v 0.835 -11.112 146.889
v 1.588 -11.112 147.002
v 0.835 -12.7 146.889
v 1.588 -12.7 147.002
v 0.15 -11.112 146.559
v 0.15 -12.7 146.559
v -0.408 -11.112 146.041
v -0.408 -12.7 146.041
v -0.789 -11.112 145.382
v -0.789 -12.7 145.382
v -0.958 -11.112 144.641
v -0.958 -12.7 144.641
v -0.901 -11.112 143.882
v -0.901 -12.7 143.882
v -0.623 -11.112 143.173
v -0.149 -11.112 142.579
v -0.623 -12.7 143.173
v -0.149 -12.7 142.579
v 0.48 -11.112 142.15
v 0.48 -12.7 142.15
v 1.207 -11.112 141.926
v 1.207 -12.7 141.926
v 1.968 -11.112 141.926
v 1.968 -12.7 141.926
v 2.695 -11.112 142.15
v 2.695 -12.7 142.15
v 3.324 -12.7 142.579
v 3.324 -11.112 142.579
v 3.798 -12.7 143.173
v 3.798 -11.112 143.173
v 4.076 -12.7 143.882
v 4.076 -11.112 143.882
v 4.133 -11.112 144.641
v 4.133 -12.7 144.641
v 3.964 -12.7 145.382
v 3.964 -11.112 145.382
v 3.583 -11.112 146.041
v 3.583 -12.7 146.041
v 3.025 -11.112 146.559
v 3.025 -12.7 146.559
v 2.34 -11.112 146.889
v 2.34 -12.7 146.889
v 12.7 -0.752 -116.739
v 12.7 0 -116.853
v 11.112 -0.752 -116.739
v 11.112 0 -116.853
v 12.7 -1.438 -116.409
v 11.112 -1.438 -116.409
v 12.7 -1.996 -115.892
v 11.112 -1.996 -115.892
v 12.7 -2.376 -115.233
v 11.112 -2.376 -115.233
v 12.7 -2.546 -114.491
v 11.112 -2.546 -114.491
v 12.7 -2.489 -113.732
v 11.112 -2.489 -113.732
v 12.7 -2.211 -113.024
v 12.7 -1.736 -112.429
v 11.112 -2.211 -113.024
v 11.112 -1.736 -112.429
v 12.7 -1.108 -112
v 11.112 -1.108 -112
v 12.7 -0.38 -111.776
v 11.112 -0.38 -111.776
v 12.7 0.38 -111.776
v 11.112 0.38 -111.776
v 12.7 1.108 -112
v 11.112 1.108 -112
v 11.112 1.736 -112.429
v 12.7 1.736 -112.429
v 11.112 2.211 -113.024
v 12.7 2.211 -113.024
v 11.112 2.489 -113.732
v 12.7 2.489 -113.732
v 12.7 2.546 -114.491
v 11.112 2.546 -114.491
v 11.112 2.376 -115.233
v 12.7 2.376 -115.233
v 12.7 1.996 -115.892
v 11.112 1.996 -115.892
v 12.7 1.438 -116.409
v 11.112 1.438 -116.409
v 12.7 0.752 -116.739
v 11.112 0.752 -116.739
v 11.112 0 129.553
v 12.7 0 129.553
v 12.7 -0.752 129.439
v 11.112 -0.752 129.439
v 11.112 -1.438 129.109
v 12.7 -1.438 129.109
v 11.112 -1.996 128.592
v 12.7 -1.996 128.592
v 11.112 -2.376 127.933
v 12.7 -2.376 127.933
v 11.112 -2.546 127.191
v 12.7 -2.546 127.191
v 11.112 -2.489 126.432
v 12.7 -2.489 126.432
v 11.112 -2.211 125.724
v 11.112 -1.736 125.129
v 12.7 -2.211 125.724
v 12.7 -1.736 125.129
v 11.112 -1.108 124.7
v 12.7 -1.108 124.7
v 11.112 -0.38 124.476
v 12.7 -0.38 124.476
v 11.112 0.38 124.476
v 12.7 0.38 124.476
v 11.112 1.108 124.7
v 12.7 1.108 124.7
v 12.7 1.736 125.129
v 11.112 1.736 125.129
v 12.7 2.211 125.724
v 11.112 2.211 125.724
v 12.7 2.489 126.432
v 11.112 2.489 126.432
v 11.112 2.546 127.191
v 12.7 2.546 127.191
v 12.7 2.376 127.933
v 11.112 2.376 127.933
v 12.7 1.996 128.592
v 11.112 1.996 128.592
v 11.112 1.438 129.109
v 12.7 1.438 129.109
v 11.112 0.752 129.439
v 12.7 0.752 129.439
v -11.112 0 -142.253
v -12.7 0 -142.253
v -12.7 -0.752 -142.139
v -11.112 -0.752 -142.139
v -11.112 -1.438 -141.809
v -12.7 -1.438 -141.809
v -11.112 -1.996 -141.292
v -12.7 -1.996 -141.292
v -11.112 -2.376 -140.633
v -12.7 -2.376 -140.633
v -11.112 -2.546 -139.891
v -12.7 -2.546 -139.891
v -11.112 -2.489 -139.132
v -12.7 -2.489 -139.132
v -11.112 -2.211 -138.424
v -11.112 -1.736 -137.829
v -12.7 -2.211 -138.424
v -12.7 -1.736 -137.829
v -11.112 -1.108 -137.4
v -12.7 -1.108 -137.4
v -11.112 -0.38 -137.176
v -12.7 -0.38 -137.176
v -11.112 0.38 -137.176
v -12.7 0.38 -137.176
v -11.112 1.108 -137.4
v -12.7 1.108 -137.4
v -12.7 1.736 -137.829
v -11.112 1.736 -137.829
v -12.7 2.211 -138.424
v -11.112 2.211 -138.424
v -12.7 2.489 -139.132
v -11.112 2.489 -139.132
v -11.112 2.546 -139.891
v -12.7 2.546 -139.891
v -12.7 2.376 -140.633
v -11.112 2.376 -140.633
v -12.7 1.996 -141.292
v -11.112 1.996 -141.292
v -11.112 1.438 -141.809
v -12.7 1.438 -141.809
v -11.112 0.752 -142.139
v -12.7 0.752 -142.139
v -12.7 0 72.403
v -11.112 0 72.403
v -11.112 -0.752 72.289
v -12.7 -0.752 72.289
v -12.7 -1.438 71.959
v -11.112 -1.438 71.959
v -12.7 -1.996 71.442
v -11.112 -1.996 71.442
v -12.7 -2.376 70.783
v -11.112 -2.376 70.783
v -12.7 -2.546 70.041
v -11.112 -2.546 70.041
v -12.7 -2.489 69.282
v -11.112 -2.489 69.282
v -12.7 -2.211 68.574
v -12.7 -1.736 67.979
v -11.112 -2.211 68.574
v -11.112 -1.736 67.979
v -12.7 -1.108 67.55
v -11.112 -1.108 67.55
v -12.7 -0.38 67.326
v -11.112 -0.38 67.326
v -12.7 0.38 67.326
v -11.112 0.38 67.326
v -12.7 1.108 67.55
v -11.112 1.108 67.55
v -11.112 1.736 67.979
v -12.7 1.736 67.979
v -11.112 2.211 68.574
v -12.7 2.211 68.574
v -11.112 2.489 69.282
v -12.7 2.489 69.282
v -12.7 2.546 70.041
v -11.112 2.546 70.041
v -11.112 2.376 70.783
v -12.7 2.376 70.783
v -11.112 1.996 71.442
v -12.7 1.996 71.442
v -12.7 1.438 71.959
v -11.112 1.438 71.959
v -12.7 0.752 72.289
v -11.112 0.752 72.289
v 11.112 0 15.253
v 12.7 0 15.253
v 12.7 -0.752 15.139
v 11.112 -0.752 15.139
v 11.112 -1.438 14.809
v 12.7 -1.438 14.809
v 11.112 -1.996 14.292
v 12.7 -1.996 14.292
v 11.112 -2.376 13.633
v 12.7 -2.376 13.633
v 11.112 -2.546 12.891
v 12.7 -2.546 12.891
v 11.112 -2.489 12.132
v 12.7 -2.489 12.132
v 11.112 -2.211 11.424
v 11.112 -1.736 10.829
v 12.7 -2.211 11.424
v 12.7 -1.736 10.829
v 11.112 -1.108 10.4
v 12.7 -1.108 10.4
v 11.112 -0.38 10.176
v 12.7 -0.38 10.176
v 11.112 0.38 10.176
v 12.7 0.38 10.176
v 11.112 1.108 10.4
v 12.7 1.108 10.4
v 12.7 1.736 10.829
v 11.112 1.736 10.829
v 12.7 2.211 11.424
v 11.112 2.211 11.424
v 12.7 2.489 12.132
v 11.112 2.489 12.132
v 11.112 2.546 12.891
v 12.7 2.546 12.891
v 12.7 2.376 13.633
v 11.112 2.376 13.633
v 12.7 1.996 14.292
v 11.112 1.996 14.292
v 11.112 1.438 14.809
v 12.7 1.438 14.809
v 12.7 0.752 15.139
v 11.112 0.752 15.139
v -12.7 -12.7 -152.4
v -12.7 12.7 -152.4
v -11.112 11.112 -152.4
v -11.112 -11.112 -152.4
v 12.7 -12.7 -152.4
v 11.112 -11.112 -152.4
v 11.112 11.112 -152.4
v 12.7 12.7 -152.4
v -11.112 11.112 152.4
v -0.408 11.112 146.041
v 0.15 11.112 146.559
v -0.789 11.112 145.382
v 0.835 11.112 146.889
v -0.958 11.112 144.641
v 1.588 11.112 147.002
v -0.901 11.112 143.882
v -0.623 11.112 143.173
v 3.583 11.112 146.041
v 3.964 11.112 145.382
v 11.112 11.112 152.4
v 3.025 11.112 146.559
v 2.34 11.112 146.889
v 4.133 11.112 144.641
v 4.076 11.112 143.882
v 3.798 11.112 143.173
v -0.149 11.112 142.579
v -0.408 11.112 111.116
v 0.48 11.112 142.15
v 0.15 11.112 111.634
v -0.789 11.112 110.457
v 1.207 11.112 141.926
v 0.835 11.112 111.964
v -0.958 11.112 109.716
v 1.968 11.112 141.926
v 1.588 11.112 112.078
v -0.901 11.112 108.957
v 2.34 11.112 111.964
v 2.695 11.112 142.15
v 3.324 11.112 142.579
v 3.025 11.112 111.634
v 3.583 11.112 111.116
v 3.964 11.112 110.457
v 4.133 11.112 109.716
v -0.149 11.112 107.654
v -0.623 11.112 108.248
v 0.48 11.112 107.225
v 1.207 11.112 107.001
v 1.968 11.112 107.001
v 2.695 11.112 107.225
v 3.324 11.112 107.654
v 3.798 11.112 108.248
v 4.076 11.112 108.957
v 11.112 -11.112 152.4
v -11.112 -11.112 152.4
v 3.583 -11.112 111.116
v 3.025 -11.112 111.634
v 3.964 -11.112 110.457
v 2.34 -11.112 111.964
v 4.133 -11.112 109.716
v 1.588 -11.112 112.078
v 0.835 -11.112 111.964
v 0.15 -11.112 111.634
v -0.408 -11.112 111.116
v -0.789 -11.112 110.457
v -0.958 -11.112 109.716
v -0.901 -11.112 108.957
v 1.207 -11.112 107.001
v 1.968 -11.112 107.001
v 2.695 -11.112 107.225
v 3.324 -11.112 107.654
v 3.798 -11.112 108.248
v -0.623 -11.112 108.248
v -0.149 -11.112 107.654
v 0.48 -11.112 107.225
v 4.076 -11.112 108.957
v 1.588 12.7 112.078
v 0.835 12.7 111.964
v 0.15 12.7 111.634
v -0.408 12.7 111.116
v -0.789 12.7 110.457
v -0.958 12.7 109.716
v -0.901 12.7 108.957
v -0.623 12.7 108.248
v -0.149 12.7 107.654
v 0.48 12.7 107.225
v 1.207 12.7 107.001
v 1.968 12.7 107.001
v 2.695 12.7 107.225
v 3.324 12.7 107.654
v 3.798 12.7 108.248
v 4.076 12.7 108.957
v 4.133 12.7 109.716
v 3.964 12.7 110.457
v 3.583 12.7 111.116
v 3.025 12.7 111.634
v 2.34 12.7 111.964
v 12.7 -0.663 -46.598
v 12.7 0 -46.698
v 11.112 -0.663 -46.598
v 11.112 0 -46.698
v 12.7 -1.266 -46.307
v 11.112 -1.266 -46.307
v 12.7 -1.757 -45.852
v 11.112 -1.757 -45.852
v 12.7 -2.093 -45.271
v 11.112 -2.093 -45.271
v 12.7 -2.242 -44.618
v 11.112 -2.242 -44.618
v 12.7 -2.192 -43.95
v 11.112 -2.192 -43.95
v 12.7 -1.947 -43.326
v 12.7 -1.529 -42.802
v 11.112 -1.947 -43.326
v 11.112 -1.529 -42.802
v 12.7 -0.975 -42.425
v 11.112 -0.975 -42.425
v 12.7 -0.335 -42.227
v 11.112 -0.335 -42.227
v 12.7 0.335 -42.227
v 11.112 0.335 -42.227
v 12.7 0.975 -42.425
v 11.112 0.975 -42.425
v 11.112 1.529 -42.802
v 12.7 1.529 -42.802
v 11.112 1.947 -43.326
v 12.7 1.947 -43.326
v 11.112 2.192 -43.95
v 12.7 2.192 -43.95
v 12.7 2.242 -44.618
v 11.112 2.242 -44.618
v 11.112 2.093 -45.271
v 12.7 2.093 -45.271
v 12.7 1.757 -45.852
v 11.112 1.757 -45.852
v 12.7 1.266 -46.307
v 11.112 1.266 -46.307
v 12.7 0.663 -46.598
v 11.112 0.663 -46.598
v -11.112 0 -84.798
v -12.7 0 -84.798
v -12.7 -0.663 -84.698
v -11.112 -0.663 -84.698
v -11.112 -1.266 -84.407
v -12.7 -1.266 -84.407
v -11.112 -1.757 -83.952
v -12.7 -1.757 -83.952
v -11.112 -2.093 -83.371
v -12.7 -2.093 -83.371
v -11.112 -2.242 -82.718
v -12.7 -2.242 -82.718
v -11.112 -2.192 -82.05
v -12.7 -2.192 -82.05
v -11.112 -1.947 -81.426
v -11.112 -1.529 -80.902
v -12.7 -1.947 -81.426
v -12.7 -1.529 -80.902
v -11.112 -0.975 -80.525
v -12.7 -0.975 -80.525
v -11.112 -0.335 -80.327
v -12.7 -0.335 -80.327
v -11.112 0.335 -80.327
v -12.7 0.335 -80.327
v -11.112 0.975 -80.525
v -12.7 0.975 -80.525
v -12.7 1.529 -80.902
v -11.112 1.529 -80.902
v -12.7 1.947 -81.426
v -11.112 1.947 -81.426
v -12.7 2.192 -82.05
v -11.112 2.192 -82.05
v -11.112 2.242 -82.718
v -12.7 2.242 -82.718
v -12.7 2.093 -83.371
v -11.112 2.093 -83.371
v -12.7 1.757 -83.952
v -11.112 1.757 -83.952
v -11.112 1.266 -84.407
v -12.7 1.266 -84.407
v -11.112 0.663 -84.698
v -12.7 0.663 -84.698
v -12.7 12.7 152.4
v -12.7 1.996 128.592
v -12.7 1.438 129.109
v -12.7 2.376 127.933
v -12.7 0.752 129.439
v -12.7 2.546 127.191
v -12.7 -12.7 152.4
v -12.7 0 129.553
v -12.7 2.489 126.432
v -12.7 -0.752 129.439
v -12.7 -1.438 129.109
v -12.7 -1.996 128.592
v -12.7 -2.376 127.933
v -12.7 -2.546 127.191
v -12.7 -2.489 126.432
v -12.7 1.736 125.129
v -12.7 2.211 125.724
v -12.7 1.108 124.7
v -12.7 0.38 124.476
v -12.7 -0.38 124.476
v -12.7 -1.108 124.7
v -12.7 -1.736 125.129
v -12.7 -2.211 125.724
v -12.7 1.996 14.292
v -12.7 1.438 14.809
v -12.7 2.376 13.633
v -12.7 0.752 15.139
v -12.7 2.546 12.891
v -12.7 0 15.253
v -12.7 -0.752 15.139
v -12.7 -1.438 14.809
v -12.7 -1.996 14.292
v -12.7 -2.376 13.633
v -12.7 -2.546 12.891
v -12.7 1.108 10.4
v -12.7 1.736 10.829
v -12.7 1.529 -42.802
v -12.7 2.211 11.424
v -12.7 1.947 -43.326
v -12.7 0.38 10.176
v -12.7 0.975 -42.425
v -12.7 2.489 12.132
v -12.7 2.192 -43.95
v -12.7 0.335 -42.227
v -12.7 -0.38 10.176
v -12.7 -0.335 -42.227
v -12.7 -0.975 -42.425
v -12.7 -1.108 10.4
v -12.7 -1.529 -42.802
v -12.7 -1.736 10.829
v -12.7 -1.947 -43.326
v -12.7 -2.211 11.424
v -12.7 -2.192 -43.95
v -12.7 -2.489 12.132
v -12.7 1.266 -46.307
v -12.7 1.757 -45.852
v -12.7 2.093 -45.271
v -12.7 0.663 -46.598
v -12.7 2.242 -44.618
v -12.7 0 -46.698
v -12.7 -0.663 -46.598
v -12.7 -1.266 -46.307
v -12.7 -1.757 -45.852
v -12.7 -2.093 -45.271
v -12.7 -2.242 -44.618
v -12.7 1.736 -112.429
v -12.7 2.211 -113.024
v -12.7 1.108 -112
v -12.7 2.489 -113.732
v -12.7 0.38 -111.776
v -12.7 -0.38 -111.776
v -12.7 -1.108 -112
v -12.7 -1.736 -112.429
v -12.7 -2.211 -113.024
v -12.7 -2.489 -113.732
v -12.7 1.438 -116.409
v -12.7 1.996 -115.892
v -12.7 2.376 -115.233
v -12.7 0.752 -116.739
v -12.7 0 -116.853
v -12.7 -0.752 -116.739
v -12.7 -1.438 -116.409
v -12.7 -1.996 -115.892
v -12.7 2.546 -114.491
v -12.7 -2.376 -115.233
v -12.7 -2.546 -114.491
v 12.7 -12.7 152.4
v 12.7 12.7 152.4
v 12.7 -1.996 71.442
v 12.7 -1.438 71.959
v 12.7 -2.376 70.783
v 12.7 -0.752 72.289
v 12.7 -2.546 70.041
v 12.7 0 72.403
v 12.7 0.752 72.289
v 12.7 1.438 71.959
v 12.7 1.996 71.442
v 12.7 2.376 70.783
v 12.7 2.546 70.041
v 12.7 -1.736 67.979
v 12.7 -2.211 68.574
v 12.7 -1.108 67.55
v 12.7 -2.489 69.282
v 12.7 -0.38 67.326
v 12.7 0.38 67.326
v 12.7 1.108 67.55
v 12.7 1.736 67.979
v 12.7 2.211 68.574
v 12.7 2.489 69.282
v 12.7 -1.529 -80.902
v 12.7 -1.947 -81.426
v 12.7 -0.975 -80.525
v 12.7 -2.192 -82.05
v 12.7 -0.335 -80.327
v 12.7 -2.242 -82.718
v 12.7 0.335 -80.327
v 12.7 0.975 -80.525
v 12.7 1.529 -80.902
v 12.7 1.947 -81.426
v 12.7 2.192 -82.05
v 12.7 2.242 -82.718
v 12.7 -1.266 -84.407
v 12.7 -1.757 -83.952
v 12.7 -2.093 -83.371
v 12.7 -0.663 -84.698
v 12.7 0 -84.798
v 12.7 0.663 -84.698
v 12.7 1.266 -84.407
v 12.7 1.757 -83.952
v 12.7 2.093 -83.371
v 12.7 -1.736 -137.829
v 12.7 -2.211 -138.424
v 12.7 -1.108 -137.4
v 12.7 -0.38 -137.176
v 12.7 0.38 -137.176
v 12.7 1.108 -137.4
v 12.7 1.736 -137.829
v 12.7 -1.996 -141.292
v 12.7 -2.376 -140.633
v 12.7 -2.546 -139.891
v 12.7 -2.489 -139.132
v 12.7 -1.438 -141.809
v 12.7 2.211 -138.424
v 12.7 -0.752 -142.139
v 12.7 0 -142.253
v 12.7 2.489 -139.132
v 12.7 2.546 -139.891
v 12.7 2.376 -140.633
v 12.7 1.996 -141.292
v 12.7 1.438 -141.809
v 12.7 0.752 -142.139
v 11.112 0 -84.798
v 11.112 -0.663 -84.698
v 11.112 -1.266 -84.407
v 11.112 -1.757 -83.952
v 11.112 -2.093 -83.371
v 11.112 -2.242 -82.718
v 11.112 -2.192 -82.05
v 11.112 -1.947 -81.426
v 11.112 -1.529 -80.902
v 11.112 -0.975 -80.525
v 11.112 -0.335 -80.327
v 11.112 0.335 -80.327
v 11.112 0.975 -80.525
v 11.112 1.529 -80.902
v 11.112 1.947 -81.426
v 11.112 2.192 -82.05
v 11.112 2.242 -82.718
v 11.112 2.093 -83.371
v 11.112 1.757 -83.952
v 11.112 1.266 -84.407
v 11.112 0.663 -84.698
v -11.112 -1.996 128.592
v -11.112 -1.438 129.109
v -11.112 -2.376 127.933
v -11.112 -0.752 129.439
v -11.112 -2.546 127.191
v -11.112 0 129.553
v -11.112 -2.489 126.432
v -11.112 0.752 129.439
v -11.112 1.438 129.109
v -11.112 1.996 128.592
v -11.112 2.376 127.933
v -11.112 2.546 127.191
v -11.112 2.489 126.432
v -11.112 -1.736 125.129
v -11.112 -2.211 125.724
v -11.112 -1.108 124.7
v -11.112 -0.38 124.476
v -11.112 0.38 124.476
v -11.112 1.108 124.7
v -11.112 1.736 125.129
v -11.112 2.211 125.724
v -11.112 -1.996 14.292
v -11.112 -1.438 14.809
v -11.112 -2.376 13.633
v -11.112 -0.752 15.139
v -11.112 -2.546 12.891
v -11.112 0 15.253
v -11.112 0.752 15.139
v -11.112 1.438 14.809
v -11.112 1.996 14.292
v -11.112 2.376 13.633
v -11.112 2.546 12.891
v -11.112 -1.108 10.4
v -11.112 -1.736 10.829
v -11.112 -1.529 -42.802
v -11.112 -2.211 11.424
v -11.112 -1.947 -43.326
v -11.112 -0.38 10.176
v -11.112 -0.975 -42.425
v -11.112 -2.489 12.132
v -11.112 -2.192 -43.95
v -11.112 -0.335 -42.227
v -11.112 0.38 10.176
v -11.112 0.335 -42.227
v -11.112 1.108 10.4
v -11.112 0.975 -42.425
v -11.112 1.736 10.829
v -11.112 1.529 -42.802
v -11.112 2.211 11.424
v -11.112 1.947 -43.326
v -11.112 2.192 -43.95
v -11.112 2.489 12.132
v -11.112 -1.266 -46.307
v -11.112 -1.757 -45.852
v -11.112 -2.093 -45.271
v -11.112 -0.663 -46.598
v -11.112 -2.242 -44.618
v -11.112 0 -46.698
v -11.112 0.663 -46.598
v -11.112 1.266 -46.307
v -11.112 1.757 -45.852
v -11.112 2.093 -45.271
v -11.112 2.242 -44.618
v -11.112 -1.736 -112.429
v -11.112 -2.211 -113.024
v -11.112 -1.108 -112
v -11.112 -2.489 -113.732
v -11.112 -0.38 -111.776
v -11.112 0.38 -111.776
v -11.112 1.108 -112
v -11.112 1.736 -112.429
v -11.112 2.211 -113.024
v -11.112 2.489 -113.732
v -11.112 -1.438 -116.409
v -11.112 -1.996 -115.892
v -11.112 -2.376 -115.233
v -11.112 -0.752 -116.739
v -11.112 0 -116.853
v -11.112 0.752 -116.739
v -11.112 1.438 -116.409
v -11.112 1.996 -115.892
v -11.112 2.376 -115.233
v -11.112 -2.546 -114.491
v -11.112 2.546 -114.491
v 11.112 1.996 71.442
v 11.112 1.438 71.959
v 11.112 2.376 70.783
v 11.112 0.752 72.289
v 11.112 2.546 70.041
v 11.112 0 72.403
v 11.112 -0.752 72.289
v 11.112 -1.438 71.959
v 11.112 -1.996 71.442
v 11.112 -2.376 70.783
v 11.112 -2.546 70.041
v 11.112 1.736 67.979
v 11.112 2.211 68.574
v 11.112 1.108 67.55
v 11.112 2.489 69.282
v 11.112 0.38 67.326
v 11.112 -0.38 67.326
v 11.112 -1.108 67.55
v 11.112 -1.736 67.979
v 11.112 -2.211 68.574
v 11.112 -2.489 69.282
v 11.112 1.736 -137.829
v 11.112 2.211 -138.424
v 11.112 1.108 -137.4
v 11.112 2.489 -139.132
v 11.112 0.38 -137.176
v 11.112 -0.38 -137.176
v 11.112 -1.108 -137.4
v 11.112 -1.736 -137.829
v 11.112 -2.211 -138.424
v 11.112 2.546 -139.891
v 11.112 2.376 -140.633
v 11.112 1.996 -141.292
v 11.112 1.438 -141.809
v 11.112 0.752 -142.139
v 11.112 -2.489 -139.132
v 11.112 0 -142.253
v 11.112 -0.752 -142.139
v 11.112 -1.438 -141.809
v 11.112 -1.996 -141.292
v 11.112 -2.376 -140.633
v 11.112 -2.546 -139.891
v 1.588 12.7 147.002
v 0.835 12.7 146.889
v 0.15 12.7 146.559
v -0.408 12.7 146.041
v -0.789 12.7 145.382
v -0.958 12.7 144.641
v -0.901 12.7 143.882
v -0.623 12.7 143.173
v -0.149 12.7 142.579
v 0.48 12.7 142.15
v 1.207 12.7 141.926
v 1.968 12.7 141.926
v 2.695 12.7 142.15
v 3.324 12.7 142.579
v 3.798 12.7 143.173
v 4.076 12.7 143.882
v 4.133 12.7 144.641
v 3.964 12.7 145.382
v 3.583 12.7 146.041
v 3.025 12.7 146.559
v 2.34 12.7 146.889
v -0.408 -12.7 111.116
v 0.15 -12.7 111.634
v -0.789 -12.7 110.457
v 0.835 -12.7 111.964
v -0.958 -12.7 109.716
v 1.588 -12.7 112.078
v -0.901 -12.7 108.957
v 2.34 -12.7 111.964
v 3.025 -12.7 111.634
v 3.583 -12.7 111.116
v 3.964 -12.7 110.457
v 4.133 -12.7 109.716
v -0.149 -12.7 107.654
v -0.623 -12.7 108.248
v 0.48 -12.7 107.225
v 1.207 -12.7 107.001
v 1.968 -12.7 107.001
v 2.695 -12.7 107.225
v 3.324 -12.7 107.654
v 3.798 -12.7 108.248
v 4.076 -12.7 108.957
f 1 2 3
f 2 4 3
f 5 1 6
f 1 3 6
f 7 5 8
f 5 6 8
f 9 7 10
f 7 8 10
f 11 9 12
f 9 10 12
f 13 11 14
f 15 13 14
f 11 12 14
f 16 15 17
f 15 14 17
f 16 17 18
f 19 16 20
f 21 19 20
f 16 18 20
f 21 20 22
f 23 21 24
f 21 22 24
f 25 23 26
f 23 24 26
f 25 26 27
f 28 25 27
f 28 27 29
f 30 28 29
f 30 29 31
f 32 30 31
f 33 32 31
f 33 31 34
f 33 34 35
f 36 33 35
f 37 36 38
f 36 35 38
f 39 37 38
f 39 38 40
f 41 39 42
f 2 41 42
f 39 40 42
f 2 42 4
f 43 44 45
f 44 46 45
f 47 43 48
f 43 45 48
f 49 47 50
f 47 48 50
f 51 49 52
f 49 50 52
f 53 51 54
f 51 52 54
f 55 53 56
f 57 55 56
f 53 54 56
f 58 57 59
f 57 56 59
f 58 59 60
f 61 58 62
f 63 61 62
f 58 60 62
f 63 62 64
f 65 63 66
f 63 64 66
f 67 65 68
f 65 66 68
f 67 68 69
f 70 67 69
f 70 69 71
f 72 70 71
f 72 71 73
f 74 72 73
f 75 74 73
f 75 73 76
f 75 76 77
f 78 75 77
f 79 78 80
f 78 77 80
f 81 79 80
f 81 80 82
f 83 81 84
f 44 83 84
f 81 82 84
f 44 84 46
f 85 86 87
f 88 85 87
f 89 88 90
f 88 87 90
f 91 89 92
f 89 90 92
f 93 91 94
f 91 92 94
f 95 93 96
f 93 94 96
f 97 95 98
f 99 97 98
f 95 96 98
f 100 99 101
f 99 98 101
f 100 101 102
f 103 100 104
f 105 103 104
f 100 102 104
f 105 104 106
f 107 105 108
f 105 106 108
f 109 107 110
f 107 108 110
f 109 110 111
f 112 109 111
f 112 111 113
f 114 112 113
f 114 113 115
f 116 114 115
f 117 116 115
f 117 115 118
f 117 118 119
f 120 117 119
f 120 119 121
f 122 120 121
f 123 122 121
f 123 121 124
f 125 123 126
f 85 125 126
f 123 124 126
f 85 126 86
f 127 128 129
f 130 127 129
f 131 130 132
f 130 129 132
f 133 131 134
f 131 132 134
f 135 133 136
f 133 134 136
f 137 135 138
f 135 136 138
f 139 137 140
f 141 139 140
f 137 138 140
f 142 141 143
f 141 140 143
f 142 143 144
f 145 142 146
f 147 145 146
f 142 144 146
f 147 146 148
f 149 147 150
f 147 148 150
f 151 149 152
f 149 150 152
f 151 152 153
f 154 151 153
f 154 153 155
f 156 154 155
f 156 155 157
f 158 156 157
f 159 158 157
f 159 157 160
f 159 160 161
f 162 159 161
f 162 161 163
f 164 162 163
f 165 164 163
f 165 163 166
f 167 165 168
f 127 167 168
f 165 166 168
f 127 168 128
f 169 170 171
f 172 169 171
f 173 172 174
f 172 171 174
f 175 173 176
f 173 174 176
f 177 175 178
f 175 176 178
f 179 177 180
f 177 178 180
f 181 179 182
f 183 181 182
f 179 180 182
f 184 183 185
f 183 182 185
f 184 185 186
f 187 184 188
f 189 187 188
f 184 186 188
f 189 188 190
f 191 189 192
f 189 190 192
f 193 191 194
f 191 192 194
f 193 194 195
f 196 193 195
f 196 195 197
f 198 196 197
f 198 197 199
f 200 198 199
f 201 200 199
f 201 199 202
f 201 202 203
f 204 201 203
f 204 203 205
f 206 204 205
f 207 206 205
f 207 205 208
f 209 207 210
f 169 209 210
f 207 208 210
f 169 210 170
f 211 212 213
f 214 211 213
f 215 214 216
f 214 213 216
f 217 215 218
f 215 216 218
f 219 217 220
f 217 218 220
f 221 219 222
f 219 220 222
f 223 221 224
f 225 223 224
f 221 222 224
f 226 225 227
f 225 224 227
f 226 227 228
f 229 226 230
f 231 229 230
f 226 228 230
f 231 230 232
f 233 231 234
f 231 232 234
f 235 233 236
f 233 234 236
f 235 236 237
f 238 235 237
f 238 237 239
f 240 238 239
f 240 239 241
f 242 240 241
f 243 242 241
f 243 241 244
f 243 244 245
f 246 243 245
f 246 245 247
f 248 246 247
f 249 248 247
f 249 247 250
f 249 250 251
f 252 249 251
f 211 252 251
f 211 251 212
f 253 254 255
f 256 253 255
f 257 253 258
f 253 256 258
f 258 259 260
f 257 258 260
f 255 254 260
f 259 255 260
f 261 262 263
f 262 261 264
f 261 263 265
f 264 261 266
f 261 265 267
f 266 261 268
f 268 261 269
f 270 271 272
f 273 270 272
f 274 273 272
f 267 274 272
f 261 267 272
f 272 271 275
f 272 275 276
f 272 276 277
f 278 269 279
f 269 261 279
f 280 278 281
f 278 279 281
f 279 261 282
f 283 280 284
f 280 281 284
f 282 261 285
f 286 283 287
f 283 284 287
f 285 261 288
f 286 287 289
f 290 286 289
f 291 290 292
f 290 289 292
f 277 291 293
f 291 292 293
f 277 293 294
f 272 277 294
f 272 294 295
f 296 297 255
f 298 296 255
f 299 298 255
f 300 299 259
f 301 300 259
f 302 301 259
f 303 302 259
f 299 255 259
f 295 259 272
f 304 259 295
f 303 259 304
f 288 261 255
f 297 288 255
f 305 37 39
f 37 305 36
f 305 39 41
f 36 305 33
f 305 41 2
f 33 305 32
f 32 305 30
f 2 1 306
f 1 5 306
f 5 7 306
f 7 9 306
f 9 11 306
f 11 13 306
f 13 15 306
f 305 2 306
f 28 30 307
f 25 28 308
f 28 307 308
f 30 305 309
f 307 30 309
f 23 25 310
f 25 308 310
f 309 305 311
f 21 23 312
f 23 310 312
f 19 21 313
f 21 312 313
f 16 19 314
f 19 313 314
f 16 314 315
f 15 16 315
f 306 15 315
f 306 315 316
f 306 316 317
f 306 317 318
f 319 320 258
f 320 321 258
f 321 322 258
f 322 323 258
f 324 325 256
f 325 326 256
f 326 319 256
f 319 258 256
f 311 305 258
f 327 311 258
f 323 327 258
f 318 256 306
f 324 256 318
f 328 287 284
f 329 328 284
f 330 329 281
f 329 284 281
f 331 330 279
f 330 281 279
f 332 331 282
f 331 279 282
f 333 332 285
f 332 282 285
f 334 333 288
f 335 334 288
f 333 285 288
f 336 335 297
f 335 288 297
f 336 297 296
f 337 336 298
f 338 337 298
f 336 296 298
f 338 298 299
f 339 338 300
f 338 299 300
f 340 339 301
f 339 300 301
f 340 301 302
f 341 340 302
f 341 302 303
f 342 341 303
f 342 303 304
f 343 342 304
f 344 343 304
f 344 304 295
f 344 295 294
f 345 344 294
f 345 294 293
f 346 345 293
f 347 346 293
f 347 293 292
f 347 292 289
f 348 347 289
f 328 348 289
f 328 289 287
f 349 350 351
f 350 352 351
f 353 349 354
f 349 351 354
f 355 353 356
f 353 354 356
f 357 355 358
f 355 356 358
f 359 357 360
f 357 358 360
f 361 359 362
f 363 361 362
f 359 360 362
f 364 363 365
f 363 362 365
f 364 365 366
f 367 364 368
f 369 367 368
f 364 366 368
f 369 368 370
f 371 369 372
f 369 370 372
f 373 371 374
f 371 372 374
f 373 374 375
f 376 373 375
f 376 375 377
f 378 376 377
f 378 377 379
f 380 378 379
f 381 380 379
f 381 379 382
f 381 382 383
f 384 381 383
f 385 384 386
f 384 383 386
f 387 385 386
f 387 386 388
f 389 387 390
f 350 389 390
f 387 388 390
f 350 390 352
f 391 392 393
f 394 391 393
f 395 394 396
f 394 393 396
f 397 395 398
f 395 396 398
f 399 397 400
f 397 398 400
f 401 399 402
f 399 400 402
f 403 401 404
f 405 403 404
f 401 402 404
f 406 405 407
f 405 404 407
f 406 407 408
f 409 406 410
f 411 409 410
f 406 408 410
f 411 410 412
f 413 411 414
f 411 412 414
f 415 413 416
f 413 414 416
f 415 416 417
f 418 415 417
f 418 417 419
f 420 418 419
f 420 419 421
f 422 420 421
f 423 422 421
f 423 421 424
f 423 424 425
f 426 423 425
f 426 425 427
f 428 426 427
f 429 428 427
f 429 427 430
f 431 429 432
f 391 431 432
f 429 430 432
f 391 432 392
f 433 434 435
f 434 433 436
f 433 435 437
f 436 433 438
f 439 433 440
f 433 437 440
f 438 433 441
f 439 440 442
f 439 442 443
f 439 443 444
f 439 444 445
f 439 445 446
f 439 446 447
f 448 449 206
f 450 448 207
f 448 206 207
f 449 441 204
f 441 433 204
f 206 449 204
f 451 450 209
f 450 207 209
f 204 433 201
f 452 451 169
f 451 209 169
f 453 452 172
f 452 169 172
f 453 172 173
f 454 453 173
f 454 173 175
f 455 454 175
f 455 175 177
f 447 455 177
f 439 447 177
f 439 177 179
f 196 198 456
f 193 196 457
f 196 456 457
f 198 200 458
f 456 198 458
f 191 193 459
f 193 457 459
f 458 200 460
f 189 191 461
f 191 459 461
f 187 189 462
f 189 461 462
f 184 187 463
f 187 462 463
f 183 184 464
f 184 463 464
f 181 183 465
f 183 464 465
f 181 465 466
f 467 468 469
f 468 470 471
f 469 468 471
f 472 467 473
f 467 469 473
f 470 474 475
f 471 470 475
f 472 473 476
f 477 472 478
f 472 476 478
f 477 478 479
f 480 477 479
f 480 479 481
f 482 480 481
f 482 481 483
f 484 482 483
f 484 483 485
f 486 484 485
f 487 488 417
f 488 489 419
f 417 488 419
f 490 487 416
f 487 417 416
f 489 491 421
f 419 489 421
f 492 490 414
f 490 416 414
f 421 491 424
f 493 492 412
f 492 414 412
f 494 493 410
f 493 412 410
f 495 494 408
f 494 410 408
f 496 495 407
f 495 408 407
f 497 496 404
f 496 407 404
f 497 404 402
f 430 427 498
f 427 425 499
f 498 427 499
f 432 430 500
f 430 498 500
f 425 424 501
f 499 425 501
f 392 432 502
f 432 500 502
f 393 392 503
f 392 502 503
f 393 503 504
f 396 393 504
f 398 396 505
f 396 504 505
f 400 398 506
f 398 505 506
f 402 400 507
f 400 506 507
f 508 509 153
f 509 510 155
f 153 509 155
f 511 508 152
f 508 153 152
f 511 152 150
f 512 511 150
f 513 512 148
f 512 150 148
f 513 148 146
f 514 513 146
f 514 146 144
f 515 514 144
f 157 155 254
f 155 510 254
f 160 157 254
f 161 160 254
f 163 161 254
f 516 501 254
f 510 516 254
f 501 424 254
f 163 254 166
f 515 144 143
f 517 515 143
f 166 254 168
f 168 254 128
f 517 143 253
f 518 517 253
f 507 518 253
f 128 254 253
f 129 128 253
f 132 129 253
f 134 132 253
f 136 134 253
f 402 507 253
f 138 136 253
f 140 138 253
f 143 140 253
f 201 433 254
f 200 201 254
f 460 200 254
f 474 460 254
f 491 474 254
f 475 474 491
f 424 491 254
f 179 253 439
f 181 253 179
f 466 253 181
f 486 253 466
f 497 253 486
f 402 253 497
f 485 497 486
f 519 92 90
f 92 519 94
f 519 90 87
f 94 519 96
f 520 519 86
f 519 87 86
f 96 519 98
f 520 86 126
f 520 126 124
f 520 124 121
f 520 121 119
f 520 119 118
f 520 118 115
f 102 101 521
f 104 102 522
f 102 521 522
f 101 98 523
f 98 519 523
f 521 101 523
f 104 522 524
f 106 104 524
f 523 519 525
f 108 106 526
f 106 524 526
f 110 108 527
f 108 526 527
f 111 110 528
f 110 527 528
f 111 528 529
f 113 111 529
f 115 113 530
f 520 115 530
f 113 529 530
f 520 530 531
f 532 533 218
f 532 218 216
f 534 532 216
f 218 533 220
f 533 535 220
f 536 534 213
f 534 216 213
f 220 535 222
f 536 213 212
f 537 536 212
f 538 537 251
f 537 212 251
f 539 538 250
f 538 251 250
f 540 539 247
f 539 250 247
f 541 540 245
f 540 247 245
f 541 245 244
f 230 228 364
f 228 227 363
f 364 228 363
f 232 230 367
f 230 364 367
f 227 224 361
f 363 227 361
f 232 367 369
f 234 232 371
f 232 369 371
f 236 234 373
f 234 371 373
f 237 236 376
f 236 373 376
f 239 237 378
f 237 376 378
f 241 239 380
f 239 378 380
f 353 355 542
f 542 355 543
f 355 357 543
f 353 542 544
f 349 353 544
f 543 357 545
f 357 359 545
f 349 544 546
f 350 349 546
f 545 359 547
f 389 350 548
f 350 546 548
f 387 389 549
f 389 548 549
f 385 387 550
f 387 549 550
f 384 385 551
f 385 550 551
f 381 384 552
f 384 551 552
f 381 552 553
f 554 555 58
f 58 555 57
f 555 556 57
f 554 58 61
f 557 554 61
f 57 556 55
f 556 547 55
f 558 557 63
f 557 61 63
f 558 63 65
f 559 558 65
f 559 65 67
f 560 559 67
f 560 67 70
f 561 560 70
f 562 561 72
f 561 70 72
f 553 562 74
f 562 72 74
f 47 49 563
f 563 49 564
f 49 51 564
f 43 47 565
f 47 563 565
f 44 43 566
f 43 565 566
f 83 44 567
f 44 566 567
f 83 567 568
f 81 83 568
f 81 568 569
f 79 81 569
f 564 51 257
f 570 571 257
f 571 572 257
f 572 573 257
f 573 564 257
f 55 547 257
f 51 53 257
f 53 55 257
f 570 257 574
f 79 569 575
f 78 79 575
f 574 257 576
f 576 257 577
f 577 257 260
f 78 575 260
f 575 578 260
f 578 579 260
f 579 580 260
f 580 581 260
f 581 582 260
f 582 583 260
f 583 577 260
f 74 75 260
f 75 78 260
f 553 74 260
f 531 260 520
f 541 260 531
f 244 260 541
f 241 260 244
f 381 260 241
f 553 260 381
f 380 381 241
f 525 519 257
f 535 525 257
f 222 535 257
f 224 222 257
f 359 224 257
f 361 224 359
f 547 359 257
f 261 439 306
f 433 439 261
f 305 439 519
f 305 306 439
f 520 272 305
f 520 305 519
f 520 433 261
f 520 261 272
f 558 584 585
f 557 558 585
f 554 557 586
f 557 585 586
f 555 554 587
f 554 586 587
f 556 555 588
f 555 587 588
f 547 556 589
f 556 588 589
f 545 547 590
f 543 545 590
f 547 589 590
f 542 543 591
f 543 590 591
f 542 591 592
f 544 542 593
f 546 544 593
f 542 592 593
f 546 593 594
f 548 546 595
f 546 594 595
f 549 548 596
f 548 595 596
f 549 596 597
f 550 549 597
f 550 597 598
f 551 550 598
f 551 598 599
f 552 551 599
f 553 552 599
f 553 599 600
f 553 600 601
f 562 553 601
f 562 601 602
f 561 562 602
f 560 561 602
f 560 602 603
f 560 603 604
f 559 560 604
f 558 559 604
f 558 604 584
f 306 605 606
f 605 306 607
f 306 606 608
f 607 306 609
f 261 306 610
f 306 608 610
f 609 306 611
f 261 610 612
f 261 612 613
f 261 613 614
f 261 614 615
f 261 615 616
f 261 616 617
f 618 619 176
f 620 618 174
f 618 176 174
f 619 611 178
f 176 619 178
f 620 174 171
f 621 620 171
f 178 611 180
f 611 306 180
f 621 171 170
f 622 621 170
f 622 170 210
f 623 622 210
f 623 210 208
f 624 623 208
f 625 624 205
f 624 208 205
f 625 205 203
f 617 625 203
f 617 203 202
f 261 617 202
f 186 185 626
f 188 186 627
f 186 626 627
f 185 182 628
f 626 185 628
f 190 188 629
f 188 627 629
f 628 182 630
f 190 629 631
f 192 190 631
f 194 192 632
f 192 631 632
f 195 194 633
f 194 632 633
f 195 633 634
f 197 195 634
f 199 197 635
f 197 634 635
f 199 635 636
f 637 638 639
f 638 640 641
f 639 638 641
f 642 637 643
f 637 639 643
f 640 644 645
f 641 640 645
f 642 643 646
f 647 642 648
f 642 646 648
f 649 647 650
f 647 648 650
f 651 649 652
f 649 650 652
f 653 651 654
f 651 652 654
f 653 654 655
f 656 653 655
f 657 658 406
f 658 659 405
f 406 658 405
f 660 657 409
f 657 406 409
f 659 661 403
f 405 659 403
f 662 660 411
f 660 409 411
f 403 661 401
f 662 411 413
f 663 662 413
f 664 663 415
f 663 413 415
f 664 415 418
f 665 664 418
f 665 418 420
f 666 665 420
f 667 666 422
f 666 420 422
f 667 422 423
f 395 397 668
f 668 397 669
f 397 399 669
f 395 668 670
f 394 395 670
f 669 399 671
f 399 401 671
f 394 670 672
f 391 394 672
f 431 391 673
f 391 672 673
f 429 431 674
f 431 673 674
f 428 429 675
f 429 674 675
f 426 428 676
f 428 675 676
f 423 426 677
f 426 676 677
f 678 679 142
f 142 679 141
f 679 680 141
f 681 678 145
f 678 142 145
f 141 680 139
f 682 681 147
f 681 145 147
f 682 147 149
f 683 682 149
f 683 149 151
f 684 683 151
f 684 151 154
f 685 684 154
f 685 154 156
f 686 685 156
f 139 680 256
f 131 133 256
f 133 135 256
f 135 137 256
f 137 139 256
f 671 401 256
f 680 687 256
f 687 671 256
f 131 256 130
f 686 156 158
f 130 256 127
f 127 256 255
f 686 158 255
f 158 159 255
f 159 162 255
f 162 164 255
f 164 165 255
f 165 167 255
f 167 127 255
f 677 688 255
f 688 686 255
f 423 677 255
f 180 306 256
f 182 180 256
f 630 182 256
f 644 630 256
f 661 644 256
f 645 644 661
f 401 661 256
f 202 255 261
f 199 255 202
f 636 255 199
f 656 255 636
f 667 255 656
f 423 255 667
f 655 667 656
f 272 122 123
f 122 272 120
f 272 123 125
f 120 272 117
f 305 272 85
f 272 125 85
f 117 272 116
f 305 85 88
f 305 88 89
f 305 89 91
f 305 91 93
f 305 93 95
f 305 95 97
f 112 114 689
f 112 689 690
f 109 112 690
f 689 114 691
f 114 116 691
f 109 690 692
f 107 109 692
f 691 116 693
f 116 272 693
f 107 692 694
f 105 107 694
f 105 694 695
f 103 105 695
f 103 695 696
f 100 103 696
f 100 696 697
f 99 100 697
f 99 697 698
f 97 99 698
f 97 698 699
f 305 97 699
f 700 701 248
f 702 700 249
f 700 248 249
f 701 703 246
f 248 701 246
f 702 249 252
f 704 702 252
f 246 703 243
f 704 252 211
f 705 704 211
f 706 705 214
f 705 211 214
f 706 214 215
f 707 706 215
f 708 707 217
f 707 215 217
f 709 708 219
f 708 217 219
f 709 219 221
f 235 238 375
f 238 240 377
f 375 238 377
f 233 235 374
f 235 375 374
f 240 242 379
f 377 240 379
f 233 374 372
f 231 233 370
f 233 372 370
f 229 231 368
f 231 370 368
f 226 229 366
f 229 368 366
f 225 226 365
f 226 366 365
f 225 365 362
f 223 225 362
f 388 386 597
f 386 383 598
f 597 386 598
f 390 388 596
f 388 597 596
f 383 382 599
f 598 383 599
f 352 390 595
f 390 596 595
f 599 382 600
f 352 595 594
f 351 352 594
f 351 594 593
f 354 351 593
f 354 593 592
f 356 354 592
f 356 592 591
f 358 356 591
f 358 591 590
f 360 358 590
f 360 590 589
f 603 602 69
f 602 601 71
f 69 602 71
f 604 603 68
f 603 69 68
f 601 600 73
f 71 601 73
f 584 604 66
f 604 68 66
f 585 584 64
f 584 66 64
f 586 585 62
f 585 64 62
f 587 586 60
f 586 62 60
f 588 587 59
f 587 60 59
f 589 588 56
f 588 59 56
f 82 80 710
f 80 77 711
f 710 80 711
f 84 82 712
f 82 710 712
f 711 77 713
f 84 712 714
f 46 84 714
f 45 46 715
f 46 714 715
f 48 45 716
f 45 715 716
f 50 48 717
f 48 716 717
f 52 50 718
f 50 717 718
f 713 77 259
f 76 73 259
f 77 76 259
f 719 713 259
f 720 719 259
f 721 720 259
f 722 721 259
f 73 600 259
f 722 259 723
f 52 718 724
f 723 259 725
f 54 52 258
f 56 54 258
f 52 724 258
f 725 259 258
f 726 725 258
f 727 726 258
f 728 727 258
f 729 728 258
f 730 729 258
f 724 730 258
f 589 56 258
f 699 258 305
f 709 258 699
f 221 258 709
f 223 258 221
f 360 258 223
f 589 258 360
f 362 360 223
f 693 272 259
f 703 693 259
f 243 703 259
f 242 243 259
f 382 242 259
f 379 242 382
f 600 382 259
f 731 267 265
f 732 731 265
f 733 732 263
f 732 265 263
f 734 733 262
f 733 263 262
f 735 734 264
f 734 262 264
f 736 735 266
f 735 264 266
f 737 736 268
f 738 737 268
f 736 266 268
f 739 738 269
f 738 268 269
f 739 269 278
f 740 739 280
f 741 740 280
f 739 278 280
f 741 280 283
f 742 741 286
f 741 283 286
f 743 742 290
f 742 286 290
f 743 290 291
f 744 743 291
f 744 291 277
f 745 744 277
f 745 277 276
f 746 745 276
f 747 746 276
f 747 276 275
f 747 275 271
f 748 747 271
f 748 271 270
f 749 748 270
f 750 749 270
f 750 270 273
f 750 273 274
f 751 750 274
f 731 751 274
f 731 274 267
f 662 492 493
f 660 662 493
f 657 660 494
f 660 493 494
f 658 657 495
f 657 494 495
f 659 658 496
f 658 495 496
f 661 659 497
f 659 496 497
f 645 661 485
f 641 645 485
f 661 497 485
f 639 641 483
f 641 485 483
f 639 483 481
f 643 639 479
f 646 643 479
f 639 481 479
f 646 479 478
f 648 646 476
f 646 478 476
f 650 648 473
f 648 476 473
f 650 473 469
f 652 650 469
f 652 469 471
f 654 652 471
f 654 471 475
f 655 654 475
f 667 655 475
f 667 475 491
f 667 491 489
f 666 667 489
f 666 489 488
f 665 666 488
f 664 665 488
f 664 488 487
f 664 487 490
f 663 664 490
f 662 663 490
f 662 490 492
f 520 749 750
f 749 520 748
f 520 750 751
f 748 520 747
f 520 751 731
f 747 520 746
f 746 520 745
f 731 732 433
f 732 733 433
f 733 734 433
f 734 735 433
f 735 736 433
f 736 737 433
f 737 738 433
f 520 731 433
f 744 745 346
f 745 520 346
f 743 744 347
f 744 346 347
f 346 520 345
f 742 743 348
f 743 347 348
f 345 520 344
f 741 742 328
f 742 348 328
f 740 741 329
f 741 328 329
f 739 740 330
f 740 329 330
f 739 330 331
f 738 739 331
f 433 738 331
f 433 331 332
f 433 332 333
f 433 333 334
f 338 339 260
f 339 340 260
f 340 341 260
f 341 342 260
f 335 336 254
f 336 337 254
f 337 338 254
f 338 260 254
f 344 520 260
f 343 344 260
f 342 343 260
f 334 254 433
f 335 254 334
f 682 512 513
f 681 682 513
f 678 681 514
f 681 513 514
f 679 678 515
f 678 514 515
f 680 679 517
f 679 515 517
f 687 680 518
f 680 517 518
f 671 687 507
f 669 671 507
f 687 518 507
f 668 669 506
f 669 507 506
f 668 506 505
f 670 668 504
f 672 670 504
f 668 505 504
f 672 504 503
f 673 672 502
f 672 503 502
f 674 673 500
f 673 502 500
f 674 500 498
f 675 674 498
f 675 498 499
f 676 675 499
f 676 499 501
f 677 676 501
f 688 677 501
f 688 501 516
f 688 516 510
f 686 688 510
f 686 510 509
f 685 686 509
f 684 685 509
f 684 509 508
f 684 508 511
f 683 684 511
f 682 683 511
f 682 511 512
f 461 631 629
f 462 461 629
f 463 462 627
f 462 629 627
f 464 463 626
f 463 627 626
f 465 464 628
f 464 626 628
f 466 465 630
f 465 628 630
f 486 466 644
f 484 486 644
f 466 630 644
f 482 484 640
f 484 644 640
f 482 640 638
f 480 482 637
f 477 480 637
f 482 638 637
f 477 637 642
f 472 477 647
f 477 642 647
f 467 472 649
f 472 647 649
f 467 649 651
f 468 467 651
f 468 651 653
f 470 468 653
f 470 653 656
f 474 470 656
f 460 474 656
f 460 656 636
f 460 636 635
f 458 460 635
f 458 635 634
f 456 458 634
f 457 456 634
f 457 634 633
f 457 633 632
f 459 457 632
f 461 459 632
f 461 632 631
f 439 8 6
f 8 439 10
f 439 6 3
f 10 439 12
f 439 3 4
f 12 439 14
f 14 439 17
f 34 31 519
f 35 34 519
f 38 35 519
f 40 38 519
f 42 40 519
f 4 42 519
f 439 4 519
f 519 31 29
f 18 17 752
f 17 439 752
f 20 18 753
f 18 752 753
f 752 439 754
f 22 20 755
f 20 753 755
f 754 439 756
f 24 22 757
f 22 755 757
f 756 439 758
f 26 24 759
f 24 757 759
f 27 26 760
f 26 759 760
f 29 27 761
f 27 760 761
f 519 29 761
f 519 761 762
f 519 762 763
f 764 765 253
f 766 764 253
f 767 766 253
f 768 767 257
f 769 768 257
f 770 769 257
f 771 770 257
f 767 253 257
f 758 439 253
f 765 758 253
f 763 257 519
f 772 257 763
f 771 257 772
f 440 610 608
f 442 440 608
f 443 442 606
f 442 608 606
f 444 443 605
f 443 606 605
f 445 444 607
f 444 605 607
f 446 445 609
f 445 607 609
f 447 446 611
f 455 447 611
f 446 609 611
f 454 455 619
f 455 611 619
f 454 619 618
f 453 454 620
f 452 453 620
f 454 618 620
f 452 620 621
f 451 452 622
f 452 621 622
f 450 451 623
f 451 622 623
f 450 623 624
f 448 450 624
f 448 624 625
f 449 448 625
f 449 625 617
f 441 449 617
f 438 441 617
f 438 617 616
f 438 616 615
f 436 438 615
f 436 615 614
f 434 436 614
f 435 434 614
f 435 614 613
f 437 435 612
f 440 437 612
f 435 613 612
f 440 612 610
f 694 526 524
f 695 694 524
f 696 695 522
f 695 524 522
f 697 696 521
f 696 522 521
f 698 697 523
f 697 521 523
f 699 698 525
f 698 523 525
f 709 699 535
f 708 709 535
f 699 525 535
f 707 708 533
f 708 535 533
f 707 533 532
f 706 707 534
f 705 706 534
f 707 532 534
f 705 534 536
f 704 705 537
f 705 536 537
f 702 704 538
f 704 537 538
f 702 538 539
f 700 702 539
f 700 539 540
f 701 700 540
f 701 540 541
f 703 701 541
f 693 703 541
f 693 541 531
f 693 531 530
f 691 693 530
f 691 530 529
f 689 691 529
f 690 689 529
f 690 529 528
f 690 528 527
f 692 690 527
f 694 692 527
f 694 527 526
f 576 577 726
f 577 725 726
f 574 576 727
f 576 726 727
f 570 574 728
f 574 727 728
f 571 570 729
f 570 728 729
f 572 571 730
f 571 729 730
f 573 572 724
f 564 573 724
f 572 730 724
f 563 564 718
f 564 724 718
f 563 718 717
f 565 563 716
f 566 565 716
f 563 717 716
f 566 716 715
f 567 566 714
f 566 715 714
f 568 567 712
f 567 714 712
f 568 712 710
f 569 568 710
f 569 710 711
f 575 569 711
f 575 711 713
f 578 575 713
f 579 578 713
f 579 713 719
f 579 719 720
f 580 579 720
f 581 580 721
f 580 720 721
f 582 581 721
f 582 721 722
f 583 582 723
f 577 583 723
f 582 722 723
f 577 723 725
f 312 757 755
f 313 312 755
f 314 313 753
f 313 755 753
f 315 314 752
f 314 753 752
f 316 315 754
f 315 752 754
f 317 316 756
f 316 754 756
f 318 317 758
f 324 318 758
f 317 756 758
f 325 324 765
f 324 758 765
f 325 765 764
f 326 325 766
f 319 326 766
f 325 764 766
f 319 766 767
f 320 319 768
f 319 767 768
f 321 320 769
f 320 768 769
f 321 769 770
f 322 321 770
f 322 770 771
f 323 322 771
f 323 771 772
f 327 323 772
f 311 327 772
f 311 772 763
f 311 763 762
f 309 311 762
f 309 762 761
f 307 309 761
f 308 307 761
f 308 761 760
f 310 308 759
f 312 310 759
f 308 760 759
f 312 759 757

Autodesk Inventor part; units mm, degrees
ref_plane "YZ Plane" through (0, 0, 0) normal (1, 0, 0) x (0, 1, 0)
ref_plane "XZ Plane" through (0, 0, 0) normal (0, 1, 0) x (-1, 0, 0)
ref_plane "XY Plane" through (0, 0, 0) normal (0, 0, 1) x (1, 0, 0)
sketch "Sketch1" plane through (0, 0, 0) normal (0, 0, 1) x (1, 0, 0)
  line L0 (-12.7, -12.7) -> (12.7, -12.7)
  line L1 (12.7, -12.7) -> (12.7, 12.7)
  line L2 (12.7, 12.7) -> (-12.7, 12.7)
  line L3 (-12.7, 12.7) -> (-12.7, -12.7)
  line L4 (-12.7, -12.7) -> (12.7, 12.7) construction
  line L5 (12.7, -12.7) -> (-12.7, 12.7) construction
  line L6 (-11.1125, 11.1125) -> (11.1125, 11.1125)
  line L7 (11.1125, 11.1125) -> (11.1125, -11.1125)
  line L8 (11.1125, -11.1125) -> (-11.1125, -11.1125)
  line L9 (-11.1125, -11.1125) -> (-11.1125, 11.1125)
  point P0 (0, 0)
  dimension "width" = 25.4
  dimension "height" = 25.4
  dimension "thickness" = 1.5875
extrude "Extrusion1" add sketch "Sketch1" along normal mid plane 304.8
sketch "Sketch2" plane through (12.7, -12.7, 152.4) normal (1, 0, 0) x (0, 0, -1)
  line L0 (304.8, 25.4) -> (304.8, 0) construction
  line L1 (304.8, 0) -> (0, 0) construction
  line L2 (0, 0) -> (0, 25.4) construction
  line L3 (0, 25.4) -> (304.8, 25.4) construction
  point P0 (152.4, 12.7)
  point P1 (292.1, 12.7)
  point P2 (304.8, 12.7)
  point P3 (266.7, 12.7)
  dimension "d5" = 12.7
  dimension "d6" = 25.4
hole "Hole1" at (12.7, 0, -139.7) at (12.7, 0, -114.3) direction (-1, 0, 0) diameter 5.1054 end through all clearance for "Flat Head Machine Screw (82)" size "#10" standard "Ansi Unified Screw Threads"
sketch "Sketch3" plane through (-12.7, 12.7, 152.4) normal (0, 1, 0) x (1, 0, 0)
  line L0 (25.4, 0) -> (0, 0) construction
  point P0 (12.7, 152.4)
  point P1 (14.2875, 7.9502)
  point P2 (14.2875, 42.8752)
  point P3 (12.7, 0)
  point P4 (12.7, 0)
  dimension "d14" = 34.925
  dimension "d32" = 7.9502
  dimension "d33" = 1.5875
hole "Hole2" at (1.5875, 12.7, 144.4498) at (1.5875, 12.7, 109.5248) direction (0, -1, 0) diameter 5.1054 end through all clearance for "Flat Head Machine Screw (82)" size "#10" standard "Ansi Unified Screw Threads"
sketch "Sketch4" plane through (-12.7, -12.7, 152.4) normal (-1, 0, 0) x (0, 0, 1)
  line L0 (-139.7, 12.7) -> (-25.4, 12.7) construction
  line L1 (0, 25.4) -> (0, 0) construction
  point P0 (-152.4, 12.7)
  point P1 (-82.55, 12.7)
  point P2 (-82.55, 12.7)
  dimension "d23" = 25.4
  dimension "d24" = 114.3
hole "Hole3" at (-12.7, 0, 127) at (-12.7, 0, 69.85) at (-12.7, 0, 12.7) direction (1, 0, 0) diameter 5.1054 end through all clearance for "Flat Head Machine Screw (82)" size "#10" standard "Ansi Unified Screw Threads"
sketch "Sketch5" plane through (12.7, -12.7, 152.4) normal (1, 0, 0) x (0, 0, -1)
  line L0 (304.8, 25.4) -> (0, 25.4) construction
  line L1 (304.8, 25.4) -> (304.8, 0) construction
  point P0 (152.4, 12.7)
  point P1 (196.85, 12.7)
  point P2 (234.95, 12.7)
  dimension "d34" = 38.1
  dimension "d35" = 12.7
  dimension "d36" = 69.85
hole "Hole4" at (12.7, 0, -44.45) at (12.7, 0, -82.55) direction (-1, 0, 0) diameter 4.4958 end through all clearance for "Flat Head Machine Screw (82)" size "#8" standard "Ansi Unified Screw Threads"
properties part number "CL4-002" material "Aluminum 6061"
